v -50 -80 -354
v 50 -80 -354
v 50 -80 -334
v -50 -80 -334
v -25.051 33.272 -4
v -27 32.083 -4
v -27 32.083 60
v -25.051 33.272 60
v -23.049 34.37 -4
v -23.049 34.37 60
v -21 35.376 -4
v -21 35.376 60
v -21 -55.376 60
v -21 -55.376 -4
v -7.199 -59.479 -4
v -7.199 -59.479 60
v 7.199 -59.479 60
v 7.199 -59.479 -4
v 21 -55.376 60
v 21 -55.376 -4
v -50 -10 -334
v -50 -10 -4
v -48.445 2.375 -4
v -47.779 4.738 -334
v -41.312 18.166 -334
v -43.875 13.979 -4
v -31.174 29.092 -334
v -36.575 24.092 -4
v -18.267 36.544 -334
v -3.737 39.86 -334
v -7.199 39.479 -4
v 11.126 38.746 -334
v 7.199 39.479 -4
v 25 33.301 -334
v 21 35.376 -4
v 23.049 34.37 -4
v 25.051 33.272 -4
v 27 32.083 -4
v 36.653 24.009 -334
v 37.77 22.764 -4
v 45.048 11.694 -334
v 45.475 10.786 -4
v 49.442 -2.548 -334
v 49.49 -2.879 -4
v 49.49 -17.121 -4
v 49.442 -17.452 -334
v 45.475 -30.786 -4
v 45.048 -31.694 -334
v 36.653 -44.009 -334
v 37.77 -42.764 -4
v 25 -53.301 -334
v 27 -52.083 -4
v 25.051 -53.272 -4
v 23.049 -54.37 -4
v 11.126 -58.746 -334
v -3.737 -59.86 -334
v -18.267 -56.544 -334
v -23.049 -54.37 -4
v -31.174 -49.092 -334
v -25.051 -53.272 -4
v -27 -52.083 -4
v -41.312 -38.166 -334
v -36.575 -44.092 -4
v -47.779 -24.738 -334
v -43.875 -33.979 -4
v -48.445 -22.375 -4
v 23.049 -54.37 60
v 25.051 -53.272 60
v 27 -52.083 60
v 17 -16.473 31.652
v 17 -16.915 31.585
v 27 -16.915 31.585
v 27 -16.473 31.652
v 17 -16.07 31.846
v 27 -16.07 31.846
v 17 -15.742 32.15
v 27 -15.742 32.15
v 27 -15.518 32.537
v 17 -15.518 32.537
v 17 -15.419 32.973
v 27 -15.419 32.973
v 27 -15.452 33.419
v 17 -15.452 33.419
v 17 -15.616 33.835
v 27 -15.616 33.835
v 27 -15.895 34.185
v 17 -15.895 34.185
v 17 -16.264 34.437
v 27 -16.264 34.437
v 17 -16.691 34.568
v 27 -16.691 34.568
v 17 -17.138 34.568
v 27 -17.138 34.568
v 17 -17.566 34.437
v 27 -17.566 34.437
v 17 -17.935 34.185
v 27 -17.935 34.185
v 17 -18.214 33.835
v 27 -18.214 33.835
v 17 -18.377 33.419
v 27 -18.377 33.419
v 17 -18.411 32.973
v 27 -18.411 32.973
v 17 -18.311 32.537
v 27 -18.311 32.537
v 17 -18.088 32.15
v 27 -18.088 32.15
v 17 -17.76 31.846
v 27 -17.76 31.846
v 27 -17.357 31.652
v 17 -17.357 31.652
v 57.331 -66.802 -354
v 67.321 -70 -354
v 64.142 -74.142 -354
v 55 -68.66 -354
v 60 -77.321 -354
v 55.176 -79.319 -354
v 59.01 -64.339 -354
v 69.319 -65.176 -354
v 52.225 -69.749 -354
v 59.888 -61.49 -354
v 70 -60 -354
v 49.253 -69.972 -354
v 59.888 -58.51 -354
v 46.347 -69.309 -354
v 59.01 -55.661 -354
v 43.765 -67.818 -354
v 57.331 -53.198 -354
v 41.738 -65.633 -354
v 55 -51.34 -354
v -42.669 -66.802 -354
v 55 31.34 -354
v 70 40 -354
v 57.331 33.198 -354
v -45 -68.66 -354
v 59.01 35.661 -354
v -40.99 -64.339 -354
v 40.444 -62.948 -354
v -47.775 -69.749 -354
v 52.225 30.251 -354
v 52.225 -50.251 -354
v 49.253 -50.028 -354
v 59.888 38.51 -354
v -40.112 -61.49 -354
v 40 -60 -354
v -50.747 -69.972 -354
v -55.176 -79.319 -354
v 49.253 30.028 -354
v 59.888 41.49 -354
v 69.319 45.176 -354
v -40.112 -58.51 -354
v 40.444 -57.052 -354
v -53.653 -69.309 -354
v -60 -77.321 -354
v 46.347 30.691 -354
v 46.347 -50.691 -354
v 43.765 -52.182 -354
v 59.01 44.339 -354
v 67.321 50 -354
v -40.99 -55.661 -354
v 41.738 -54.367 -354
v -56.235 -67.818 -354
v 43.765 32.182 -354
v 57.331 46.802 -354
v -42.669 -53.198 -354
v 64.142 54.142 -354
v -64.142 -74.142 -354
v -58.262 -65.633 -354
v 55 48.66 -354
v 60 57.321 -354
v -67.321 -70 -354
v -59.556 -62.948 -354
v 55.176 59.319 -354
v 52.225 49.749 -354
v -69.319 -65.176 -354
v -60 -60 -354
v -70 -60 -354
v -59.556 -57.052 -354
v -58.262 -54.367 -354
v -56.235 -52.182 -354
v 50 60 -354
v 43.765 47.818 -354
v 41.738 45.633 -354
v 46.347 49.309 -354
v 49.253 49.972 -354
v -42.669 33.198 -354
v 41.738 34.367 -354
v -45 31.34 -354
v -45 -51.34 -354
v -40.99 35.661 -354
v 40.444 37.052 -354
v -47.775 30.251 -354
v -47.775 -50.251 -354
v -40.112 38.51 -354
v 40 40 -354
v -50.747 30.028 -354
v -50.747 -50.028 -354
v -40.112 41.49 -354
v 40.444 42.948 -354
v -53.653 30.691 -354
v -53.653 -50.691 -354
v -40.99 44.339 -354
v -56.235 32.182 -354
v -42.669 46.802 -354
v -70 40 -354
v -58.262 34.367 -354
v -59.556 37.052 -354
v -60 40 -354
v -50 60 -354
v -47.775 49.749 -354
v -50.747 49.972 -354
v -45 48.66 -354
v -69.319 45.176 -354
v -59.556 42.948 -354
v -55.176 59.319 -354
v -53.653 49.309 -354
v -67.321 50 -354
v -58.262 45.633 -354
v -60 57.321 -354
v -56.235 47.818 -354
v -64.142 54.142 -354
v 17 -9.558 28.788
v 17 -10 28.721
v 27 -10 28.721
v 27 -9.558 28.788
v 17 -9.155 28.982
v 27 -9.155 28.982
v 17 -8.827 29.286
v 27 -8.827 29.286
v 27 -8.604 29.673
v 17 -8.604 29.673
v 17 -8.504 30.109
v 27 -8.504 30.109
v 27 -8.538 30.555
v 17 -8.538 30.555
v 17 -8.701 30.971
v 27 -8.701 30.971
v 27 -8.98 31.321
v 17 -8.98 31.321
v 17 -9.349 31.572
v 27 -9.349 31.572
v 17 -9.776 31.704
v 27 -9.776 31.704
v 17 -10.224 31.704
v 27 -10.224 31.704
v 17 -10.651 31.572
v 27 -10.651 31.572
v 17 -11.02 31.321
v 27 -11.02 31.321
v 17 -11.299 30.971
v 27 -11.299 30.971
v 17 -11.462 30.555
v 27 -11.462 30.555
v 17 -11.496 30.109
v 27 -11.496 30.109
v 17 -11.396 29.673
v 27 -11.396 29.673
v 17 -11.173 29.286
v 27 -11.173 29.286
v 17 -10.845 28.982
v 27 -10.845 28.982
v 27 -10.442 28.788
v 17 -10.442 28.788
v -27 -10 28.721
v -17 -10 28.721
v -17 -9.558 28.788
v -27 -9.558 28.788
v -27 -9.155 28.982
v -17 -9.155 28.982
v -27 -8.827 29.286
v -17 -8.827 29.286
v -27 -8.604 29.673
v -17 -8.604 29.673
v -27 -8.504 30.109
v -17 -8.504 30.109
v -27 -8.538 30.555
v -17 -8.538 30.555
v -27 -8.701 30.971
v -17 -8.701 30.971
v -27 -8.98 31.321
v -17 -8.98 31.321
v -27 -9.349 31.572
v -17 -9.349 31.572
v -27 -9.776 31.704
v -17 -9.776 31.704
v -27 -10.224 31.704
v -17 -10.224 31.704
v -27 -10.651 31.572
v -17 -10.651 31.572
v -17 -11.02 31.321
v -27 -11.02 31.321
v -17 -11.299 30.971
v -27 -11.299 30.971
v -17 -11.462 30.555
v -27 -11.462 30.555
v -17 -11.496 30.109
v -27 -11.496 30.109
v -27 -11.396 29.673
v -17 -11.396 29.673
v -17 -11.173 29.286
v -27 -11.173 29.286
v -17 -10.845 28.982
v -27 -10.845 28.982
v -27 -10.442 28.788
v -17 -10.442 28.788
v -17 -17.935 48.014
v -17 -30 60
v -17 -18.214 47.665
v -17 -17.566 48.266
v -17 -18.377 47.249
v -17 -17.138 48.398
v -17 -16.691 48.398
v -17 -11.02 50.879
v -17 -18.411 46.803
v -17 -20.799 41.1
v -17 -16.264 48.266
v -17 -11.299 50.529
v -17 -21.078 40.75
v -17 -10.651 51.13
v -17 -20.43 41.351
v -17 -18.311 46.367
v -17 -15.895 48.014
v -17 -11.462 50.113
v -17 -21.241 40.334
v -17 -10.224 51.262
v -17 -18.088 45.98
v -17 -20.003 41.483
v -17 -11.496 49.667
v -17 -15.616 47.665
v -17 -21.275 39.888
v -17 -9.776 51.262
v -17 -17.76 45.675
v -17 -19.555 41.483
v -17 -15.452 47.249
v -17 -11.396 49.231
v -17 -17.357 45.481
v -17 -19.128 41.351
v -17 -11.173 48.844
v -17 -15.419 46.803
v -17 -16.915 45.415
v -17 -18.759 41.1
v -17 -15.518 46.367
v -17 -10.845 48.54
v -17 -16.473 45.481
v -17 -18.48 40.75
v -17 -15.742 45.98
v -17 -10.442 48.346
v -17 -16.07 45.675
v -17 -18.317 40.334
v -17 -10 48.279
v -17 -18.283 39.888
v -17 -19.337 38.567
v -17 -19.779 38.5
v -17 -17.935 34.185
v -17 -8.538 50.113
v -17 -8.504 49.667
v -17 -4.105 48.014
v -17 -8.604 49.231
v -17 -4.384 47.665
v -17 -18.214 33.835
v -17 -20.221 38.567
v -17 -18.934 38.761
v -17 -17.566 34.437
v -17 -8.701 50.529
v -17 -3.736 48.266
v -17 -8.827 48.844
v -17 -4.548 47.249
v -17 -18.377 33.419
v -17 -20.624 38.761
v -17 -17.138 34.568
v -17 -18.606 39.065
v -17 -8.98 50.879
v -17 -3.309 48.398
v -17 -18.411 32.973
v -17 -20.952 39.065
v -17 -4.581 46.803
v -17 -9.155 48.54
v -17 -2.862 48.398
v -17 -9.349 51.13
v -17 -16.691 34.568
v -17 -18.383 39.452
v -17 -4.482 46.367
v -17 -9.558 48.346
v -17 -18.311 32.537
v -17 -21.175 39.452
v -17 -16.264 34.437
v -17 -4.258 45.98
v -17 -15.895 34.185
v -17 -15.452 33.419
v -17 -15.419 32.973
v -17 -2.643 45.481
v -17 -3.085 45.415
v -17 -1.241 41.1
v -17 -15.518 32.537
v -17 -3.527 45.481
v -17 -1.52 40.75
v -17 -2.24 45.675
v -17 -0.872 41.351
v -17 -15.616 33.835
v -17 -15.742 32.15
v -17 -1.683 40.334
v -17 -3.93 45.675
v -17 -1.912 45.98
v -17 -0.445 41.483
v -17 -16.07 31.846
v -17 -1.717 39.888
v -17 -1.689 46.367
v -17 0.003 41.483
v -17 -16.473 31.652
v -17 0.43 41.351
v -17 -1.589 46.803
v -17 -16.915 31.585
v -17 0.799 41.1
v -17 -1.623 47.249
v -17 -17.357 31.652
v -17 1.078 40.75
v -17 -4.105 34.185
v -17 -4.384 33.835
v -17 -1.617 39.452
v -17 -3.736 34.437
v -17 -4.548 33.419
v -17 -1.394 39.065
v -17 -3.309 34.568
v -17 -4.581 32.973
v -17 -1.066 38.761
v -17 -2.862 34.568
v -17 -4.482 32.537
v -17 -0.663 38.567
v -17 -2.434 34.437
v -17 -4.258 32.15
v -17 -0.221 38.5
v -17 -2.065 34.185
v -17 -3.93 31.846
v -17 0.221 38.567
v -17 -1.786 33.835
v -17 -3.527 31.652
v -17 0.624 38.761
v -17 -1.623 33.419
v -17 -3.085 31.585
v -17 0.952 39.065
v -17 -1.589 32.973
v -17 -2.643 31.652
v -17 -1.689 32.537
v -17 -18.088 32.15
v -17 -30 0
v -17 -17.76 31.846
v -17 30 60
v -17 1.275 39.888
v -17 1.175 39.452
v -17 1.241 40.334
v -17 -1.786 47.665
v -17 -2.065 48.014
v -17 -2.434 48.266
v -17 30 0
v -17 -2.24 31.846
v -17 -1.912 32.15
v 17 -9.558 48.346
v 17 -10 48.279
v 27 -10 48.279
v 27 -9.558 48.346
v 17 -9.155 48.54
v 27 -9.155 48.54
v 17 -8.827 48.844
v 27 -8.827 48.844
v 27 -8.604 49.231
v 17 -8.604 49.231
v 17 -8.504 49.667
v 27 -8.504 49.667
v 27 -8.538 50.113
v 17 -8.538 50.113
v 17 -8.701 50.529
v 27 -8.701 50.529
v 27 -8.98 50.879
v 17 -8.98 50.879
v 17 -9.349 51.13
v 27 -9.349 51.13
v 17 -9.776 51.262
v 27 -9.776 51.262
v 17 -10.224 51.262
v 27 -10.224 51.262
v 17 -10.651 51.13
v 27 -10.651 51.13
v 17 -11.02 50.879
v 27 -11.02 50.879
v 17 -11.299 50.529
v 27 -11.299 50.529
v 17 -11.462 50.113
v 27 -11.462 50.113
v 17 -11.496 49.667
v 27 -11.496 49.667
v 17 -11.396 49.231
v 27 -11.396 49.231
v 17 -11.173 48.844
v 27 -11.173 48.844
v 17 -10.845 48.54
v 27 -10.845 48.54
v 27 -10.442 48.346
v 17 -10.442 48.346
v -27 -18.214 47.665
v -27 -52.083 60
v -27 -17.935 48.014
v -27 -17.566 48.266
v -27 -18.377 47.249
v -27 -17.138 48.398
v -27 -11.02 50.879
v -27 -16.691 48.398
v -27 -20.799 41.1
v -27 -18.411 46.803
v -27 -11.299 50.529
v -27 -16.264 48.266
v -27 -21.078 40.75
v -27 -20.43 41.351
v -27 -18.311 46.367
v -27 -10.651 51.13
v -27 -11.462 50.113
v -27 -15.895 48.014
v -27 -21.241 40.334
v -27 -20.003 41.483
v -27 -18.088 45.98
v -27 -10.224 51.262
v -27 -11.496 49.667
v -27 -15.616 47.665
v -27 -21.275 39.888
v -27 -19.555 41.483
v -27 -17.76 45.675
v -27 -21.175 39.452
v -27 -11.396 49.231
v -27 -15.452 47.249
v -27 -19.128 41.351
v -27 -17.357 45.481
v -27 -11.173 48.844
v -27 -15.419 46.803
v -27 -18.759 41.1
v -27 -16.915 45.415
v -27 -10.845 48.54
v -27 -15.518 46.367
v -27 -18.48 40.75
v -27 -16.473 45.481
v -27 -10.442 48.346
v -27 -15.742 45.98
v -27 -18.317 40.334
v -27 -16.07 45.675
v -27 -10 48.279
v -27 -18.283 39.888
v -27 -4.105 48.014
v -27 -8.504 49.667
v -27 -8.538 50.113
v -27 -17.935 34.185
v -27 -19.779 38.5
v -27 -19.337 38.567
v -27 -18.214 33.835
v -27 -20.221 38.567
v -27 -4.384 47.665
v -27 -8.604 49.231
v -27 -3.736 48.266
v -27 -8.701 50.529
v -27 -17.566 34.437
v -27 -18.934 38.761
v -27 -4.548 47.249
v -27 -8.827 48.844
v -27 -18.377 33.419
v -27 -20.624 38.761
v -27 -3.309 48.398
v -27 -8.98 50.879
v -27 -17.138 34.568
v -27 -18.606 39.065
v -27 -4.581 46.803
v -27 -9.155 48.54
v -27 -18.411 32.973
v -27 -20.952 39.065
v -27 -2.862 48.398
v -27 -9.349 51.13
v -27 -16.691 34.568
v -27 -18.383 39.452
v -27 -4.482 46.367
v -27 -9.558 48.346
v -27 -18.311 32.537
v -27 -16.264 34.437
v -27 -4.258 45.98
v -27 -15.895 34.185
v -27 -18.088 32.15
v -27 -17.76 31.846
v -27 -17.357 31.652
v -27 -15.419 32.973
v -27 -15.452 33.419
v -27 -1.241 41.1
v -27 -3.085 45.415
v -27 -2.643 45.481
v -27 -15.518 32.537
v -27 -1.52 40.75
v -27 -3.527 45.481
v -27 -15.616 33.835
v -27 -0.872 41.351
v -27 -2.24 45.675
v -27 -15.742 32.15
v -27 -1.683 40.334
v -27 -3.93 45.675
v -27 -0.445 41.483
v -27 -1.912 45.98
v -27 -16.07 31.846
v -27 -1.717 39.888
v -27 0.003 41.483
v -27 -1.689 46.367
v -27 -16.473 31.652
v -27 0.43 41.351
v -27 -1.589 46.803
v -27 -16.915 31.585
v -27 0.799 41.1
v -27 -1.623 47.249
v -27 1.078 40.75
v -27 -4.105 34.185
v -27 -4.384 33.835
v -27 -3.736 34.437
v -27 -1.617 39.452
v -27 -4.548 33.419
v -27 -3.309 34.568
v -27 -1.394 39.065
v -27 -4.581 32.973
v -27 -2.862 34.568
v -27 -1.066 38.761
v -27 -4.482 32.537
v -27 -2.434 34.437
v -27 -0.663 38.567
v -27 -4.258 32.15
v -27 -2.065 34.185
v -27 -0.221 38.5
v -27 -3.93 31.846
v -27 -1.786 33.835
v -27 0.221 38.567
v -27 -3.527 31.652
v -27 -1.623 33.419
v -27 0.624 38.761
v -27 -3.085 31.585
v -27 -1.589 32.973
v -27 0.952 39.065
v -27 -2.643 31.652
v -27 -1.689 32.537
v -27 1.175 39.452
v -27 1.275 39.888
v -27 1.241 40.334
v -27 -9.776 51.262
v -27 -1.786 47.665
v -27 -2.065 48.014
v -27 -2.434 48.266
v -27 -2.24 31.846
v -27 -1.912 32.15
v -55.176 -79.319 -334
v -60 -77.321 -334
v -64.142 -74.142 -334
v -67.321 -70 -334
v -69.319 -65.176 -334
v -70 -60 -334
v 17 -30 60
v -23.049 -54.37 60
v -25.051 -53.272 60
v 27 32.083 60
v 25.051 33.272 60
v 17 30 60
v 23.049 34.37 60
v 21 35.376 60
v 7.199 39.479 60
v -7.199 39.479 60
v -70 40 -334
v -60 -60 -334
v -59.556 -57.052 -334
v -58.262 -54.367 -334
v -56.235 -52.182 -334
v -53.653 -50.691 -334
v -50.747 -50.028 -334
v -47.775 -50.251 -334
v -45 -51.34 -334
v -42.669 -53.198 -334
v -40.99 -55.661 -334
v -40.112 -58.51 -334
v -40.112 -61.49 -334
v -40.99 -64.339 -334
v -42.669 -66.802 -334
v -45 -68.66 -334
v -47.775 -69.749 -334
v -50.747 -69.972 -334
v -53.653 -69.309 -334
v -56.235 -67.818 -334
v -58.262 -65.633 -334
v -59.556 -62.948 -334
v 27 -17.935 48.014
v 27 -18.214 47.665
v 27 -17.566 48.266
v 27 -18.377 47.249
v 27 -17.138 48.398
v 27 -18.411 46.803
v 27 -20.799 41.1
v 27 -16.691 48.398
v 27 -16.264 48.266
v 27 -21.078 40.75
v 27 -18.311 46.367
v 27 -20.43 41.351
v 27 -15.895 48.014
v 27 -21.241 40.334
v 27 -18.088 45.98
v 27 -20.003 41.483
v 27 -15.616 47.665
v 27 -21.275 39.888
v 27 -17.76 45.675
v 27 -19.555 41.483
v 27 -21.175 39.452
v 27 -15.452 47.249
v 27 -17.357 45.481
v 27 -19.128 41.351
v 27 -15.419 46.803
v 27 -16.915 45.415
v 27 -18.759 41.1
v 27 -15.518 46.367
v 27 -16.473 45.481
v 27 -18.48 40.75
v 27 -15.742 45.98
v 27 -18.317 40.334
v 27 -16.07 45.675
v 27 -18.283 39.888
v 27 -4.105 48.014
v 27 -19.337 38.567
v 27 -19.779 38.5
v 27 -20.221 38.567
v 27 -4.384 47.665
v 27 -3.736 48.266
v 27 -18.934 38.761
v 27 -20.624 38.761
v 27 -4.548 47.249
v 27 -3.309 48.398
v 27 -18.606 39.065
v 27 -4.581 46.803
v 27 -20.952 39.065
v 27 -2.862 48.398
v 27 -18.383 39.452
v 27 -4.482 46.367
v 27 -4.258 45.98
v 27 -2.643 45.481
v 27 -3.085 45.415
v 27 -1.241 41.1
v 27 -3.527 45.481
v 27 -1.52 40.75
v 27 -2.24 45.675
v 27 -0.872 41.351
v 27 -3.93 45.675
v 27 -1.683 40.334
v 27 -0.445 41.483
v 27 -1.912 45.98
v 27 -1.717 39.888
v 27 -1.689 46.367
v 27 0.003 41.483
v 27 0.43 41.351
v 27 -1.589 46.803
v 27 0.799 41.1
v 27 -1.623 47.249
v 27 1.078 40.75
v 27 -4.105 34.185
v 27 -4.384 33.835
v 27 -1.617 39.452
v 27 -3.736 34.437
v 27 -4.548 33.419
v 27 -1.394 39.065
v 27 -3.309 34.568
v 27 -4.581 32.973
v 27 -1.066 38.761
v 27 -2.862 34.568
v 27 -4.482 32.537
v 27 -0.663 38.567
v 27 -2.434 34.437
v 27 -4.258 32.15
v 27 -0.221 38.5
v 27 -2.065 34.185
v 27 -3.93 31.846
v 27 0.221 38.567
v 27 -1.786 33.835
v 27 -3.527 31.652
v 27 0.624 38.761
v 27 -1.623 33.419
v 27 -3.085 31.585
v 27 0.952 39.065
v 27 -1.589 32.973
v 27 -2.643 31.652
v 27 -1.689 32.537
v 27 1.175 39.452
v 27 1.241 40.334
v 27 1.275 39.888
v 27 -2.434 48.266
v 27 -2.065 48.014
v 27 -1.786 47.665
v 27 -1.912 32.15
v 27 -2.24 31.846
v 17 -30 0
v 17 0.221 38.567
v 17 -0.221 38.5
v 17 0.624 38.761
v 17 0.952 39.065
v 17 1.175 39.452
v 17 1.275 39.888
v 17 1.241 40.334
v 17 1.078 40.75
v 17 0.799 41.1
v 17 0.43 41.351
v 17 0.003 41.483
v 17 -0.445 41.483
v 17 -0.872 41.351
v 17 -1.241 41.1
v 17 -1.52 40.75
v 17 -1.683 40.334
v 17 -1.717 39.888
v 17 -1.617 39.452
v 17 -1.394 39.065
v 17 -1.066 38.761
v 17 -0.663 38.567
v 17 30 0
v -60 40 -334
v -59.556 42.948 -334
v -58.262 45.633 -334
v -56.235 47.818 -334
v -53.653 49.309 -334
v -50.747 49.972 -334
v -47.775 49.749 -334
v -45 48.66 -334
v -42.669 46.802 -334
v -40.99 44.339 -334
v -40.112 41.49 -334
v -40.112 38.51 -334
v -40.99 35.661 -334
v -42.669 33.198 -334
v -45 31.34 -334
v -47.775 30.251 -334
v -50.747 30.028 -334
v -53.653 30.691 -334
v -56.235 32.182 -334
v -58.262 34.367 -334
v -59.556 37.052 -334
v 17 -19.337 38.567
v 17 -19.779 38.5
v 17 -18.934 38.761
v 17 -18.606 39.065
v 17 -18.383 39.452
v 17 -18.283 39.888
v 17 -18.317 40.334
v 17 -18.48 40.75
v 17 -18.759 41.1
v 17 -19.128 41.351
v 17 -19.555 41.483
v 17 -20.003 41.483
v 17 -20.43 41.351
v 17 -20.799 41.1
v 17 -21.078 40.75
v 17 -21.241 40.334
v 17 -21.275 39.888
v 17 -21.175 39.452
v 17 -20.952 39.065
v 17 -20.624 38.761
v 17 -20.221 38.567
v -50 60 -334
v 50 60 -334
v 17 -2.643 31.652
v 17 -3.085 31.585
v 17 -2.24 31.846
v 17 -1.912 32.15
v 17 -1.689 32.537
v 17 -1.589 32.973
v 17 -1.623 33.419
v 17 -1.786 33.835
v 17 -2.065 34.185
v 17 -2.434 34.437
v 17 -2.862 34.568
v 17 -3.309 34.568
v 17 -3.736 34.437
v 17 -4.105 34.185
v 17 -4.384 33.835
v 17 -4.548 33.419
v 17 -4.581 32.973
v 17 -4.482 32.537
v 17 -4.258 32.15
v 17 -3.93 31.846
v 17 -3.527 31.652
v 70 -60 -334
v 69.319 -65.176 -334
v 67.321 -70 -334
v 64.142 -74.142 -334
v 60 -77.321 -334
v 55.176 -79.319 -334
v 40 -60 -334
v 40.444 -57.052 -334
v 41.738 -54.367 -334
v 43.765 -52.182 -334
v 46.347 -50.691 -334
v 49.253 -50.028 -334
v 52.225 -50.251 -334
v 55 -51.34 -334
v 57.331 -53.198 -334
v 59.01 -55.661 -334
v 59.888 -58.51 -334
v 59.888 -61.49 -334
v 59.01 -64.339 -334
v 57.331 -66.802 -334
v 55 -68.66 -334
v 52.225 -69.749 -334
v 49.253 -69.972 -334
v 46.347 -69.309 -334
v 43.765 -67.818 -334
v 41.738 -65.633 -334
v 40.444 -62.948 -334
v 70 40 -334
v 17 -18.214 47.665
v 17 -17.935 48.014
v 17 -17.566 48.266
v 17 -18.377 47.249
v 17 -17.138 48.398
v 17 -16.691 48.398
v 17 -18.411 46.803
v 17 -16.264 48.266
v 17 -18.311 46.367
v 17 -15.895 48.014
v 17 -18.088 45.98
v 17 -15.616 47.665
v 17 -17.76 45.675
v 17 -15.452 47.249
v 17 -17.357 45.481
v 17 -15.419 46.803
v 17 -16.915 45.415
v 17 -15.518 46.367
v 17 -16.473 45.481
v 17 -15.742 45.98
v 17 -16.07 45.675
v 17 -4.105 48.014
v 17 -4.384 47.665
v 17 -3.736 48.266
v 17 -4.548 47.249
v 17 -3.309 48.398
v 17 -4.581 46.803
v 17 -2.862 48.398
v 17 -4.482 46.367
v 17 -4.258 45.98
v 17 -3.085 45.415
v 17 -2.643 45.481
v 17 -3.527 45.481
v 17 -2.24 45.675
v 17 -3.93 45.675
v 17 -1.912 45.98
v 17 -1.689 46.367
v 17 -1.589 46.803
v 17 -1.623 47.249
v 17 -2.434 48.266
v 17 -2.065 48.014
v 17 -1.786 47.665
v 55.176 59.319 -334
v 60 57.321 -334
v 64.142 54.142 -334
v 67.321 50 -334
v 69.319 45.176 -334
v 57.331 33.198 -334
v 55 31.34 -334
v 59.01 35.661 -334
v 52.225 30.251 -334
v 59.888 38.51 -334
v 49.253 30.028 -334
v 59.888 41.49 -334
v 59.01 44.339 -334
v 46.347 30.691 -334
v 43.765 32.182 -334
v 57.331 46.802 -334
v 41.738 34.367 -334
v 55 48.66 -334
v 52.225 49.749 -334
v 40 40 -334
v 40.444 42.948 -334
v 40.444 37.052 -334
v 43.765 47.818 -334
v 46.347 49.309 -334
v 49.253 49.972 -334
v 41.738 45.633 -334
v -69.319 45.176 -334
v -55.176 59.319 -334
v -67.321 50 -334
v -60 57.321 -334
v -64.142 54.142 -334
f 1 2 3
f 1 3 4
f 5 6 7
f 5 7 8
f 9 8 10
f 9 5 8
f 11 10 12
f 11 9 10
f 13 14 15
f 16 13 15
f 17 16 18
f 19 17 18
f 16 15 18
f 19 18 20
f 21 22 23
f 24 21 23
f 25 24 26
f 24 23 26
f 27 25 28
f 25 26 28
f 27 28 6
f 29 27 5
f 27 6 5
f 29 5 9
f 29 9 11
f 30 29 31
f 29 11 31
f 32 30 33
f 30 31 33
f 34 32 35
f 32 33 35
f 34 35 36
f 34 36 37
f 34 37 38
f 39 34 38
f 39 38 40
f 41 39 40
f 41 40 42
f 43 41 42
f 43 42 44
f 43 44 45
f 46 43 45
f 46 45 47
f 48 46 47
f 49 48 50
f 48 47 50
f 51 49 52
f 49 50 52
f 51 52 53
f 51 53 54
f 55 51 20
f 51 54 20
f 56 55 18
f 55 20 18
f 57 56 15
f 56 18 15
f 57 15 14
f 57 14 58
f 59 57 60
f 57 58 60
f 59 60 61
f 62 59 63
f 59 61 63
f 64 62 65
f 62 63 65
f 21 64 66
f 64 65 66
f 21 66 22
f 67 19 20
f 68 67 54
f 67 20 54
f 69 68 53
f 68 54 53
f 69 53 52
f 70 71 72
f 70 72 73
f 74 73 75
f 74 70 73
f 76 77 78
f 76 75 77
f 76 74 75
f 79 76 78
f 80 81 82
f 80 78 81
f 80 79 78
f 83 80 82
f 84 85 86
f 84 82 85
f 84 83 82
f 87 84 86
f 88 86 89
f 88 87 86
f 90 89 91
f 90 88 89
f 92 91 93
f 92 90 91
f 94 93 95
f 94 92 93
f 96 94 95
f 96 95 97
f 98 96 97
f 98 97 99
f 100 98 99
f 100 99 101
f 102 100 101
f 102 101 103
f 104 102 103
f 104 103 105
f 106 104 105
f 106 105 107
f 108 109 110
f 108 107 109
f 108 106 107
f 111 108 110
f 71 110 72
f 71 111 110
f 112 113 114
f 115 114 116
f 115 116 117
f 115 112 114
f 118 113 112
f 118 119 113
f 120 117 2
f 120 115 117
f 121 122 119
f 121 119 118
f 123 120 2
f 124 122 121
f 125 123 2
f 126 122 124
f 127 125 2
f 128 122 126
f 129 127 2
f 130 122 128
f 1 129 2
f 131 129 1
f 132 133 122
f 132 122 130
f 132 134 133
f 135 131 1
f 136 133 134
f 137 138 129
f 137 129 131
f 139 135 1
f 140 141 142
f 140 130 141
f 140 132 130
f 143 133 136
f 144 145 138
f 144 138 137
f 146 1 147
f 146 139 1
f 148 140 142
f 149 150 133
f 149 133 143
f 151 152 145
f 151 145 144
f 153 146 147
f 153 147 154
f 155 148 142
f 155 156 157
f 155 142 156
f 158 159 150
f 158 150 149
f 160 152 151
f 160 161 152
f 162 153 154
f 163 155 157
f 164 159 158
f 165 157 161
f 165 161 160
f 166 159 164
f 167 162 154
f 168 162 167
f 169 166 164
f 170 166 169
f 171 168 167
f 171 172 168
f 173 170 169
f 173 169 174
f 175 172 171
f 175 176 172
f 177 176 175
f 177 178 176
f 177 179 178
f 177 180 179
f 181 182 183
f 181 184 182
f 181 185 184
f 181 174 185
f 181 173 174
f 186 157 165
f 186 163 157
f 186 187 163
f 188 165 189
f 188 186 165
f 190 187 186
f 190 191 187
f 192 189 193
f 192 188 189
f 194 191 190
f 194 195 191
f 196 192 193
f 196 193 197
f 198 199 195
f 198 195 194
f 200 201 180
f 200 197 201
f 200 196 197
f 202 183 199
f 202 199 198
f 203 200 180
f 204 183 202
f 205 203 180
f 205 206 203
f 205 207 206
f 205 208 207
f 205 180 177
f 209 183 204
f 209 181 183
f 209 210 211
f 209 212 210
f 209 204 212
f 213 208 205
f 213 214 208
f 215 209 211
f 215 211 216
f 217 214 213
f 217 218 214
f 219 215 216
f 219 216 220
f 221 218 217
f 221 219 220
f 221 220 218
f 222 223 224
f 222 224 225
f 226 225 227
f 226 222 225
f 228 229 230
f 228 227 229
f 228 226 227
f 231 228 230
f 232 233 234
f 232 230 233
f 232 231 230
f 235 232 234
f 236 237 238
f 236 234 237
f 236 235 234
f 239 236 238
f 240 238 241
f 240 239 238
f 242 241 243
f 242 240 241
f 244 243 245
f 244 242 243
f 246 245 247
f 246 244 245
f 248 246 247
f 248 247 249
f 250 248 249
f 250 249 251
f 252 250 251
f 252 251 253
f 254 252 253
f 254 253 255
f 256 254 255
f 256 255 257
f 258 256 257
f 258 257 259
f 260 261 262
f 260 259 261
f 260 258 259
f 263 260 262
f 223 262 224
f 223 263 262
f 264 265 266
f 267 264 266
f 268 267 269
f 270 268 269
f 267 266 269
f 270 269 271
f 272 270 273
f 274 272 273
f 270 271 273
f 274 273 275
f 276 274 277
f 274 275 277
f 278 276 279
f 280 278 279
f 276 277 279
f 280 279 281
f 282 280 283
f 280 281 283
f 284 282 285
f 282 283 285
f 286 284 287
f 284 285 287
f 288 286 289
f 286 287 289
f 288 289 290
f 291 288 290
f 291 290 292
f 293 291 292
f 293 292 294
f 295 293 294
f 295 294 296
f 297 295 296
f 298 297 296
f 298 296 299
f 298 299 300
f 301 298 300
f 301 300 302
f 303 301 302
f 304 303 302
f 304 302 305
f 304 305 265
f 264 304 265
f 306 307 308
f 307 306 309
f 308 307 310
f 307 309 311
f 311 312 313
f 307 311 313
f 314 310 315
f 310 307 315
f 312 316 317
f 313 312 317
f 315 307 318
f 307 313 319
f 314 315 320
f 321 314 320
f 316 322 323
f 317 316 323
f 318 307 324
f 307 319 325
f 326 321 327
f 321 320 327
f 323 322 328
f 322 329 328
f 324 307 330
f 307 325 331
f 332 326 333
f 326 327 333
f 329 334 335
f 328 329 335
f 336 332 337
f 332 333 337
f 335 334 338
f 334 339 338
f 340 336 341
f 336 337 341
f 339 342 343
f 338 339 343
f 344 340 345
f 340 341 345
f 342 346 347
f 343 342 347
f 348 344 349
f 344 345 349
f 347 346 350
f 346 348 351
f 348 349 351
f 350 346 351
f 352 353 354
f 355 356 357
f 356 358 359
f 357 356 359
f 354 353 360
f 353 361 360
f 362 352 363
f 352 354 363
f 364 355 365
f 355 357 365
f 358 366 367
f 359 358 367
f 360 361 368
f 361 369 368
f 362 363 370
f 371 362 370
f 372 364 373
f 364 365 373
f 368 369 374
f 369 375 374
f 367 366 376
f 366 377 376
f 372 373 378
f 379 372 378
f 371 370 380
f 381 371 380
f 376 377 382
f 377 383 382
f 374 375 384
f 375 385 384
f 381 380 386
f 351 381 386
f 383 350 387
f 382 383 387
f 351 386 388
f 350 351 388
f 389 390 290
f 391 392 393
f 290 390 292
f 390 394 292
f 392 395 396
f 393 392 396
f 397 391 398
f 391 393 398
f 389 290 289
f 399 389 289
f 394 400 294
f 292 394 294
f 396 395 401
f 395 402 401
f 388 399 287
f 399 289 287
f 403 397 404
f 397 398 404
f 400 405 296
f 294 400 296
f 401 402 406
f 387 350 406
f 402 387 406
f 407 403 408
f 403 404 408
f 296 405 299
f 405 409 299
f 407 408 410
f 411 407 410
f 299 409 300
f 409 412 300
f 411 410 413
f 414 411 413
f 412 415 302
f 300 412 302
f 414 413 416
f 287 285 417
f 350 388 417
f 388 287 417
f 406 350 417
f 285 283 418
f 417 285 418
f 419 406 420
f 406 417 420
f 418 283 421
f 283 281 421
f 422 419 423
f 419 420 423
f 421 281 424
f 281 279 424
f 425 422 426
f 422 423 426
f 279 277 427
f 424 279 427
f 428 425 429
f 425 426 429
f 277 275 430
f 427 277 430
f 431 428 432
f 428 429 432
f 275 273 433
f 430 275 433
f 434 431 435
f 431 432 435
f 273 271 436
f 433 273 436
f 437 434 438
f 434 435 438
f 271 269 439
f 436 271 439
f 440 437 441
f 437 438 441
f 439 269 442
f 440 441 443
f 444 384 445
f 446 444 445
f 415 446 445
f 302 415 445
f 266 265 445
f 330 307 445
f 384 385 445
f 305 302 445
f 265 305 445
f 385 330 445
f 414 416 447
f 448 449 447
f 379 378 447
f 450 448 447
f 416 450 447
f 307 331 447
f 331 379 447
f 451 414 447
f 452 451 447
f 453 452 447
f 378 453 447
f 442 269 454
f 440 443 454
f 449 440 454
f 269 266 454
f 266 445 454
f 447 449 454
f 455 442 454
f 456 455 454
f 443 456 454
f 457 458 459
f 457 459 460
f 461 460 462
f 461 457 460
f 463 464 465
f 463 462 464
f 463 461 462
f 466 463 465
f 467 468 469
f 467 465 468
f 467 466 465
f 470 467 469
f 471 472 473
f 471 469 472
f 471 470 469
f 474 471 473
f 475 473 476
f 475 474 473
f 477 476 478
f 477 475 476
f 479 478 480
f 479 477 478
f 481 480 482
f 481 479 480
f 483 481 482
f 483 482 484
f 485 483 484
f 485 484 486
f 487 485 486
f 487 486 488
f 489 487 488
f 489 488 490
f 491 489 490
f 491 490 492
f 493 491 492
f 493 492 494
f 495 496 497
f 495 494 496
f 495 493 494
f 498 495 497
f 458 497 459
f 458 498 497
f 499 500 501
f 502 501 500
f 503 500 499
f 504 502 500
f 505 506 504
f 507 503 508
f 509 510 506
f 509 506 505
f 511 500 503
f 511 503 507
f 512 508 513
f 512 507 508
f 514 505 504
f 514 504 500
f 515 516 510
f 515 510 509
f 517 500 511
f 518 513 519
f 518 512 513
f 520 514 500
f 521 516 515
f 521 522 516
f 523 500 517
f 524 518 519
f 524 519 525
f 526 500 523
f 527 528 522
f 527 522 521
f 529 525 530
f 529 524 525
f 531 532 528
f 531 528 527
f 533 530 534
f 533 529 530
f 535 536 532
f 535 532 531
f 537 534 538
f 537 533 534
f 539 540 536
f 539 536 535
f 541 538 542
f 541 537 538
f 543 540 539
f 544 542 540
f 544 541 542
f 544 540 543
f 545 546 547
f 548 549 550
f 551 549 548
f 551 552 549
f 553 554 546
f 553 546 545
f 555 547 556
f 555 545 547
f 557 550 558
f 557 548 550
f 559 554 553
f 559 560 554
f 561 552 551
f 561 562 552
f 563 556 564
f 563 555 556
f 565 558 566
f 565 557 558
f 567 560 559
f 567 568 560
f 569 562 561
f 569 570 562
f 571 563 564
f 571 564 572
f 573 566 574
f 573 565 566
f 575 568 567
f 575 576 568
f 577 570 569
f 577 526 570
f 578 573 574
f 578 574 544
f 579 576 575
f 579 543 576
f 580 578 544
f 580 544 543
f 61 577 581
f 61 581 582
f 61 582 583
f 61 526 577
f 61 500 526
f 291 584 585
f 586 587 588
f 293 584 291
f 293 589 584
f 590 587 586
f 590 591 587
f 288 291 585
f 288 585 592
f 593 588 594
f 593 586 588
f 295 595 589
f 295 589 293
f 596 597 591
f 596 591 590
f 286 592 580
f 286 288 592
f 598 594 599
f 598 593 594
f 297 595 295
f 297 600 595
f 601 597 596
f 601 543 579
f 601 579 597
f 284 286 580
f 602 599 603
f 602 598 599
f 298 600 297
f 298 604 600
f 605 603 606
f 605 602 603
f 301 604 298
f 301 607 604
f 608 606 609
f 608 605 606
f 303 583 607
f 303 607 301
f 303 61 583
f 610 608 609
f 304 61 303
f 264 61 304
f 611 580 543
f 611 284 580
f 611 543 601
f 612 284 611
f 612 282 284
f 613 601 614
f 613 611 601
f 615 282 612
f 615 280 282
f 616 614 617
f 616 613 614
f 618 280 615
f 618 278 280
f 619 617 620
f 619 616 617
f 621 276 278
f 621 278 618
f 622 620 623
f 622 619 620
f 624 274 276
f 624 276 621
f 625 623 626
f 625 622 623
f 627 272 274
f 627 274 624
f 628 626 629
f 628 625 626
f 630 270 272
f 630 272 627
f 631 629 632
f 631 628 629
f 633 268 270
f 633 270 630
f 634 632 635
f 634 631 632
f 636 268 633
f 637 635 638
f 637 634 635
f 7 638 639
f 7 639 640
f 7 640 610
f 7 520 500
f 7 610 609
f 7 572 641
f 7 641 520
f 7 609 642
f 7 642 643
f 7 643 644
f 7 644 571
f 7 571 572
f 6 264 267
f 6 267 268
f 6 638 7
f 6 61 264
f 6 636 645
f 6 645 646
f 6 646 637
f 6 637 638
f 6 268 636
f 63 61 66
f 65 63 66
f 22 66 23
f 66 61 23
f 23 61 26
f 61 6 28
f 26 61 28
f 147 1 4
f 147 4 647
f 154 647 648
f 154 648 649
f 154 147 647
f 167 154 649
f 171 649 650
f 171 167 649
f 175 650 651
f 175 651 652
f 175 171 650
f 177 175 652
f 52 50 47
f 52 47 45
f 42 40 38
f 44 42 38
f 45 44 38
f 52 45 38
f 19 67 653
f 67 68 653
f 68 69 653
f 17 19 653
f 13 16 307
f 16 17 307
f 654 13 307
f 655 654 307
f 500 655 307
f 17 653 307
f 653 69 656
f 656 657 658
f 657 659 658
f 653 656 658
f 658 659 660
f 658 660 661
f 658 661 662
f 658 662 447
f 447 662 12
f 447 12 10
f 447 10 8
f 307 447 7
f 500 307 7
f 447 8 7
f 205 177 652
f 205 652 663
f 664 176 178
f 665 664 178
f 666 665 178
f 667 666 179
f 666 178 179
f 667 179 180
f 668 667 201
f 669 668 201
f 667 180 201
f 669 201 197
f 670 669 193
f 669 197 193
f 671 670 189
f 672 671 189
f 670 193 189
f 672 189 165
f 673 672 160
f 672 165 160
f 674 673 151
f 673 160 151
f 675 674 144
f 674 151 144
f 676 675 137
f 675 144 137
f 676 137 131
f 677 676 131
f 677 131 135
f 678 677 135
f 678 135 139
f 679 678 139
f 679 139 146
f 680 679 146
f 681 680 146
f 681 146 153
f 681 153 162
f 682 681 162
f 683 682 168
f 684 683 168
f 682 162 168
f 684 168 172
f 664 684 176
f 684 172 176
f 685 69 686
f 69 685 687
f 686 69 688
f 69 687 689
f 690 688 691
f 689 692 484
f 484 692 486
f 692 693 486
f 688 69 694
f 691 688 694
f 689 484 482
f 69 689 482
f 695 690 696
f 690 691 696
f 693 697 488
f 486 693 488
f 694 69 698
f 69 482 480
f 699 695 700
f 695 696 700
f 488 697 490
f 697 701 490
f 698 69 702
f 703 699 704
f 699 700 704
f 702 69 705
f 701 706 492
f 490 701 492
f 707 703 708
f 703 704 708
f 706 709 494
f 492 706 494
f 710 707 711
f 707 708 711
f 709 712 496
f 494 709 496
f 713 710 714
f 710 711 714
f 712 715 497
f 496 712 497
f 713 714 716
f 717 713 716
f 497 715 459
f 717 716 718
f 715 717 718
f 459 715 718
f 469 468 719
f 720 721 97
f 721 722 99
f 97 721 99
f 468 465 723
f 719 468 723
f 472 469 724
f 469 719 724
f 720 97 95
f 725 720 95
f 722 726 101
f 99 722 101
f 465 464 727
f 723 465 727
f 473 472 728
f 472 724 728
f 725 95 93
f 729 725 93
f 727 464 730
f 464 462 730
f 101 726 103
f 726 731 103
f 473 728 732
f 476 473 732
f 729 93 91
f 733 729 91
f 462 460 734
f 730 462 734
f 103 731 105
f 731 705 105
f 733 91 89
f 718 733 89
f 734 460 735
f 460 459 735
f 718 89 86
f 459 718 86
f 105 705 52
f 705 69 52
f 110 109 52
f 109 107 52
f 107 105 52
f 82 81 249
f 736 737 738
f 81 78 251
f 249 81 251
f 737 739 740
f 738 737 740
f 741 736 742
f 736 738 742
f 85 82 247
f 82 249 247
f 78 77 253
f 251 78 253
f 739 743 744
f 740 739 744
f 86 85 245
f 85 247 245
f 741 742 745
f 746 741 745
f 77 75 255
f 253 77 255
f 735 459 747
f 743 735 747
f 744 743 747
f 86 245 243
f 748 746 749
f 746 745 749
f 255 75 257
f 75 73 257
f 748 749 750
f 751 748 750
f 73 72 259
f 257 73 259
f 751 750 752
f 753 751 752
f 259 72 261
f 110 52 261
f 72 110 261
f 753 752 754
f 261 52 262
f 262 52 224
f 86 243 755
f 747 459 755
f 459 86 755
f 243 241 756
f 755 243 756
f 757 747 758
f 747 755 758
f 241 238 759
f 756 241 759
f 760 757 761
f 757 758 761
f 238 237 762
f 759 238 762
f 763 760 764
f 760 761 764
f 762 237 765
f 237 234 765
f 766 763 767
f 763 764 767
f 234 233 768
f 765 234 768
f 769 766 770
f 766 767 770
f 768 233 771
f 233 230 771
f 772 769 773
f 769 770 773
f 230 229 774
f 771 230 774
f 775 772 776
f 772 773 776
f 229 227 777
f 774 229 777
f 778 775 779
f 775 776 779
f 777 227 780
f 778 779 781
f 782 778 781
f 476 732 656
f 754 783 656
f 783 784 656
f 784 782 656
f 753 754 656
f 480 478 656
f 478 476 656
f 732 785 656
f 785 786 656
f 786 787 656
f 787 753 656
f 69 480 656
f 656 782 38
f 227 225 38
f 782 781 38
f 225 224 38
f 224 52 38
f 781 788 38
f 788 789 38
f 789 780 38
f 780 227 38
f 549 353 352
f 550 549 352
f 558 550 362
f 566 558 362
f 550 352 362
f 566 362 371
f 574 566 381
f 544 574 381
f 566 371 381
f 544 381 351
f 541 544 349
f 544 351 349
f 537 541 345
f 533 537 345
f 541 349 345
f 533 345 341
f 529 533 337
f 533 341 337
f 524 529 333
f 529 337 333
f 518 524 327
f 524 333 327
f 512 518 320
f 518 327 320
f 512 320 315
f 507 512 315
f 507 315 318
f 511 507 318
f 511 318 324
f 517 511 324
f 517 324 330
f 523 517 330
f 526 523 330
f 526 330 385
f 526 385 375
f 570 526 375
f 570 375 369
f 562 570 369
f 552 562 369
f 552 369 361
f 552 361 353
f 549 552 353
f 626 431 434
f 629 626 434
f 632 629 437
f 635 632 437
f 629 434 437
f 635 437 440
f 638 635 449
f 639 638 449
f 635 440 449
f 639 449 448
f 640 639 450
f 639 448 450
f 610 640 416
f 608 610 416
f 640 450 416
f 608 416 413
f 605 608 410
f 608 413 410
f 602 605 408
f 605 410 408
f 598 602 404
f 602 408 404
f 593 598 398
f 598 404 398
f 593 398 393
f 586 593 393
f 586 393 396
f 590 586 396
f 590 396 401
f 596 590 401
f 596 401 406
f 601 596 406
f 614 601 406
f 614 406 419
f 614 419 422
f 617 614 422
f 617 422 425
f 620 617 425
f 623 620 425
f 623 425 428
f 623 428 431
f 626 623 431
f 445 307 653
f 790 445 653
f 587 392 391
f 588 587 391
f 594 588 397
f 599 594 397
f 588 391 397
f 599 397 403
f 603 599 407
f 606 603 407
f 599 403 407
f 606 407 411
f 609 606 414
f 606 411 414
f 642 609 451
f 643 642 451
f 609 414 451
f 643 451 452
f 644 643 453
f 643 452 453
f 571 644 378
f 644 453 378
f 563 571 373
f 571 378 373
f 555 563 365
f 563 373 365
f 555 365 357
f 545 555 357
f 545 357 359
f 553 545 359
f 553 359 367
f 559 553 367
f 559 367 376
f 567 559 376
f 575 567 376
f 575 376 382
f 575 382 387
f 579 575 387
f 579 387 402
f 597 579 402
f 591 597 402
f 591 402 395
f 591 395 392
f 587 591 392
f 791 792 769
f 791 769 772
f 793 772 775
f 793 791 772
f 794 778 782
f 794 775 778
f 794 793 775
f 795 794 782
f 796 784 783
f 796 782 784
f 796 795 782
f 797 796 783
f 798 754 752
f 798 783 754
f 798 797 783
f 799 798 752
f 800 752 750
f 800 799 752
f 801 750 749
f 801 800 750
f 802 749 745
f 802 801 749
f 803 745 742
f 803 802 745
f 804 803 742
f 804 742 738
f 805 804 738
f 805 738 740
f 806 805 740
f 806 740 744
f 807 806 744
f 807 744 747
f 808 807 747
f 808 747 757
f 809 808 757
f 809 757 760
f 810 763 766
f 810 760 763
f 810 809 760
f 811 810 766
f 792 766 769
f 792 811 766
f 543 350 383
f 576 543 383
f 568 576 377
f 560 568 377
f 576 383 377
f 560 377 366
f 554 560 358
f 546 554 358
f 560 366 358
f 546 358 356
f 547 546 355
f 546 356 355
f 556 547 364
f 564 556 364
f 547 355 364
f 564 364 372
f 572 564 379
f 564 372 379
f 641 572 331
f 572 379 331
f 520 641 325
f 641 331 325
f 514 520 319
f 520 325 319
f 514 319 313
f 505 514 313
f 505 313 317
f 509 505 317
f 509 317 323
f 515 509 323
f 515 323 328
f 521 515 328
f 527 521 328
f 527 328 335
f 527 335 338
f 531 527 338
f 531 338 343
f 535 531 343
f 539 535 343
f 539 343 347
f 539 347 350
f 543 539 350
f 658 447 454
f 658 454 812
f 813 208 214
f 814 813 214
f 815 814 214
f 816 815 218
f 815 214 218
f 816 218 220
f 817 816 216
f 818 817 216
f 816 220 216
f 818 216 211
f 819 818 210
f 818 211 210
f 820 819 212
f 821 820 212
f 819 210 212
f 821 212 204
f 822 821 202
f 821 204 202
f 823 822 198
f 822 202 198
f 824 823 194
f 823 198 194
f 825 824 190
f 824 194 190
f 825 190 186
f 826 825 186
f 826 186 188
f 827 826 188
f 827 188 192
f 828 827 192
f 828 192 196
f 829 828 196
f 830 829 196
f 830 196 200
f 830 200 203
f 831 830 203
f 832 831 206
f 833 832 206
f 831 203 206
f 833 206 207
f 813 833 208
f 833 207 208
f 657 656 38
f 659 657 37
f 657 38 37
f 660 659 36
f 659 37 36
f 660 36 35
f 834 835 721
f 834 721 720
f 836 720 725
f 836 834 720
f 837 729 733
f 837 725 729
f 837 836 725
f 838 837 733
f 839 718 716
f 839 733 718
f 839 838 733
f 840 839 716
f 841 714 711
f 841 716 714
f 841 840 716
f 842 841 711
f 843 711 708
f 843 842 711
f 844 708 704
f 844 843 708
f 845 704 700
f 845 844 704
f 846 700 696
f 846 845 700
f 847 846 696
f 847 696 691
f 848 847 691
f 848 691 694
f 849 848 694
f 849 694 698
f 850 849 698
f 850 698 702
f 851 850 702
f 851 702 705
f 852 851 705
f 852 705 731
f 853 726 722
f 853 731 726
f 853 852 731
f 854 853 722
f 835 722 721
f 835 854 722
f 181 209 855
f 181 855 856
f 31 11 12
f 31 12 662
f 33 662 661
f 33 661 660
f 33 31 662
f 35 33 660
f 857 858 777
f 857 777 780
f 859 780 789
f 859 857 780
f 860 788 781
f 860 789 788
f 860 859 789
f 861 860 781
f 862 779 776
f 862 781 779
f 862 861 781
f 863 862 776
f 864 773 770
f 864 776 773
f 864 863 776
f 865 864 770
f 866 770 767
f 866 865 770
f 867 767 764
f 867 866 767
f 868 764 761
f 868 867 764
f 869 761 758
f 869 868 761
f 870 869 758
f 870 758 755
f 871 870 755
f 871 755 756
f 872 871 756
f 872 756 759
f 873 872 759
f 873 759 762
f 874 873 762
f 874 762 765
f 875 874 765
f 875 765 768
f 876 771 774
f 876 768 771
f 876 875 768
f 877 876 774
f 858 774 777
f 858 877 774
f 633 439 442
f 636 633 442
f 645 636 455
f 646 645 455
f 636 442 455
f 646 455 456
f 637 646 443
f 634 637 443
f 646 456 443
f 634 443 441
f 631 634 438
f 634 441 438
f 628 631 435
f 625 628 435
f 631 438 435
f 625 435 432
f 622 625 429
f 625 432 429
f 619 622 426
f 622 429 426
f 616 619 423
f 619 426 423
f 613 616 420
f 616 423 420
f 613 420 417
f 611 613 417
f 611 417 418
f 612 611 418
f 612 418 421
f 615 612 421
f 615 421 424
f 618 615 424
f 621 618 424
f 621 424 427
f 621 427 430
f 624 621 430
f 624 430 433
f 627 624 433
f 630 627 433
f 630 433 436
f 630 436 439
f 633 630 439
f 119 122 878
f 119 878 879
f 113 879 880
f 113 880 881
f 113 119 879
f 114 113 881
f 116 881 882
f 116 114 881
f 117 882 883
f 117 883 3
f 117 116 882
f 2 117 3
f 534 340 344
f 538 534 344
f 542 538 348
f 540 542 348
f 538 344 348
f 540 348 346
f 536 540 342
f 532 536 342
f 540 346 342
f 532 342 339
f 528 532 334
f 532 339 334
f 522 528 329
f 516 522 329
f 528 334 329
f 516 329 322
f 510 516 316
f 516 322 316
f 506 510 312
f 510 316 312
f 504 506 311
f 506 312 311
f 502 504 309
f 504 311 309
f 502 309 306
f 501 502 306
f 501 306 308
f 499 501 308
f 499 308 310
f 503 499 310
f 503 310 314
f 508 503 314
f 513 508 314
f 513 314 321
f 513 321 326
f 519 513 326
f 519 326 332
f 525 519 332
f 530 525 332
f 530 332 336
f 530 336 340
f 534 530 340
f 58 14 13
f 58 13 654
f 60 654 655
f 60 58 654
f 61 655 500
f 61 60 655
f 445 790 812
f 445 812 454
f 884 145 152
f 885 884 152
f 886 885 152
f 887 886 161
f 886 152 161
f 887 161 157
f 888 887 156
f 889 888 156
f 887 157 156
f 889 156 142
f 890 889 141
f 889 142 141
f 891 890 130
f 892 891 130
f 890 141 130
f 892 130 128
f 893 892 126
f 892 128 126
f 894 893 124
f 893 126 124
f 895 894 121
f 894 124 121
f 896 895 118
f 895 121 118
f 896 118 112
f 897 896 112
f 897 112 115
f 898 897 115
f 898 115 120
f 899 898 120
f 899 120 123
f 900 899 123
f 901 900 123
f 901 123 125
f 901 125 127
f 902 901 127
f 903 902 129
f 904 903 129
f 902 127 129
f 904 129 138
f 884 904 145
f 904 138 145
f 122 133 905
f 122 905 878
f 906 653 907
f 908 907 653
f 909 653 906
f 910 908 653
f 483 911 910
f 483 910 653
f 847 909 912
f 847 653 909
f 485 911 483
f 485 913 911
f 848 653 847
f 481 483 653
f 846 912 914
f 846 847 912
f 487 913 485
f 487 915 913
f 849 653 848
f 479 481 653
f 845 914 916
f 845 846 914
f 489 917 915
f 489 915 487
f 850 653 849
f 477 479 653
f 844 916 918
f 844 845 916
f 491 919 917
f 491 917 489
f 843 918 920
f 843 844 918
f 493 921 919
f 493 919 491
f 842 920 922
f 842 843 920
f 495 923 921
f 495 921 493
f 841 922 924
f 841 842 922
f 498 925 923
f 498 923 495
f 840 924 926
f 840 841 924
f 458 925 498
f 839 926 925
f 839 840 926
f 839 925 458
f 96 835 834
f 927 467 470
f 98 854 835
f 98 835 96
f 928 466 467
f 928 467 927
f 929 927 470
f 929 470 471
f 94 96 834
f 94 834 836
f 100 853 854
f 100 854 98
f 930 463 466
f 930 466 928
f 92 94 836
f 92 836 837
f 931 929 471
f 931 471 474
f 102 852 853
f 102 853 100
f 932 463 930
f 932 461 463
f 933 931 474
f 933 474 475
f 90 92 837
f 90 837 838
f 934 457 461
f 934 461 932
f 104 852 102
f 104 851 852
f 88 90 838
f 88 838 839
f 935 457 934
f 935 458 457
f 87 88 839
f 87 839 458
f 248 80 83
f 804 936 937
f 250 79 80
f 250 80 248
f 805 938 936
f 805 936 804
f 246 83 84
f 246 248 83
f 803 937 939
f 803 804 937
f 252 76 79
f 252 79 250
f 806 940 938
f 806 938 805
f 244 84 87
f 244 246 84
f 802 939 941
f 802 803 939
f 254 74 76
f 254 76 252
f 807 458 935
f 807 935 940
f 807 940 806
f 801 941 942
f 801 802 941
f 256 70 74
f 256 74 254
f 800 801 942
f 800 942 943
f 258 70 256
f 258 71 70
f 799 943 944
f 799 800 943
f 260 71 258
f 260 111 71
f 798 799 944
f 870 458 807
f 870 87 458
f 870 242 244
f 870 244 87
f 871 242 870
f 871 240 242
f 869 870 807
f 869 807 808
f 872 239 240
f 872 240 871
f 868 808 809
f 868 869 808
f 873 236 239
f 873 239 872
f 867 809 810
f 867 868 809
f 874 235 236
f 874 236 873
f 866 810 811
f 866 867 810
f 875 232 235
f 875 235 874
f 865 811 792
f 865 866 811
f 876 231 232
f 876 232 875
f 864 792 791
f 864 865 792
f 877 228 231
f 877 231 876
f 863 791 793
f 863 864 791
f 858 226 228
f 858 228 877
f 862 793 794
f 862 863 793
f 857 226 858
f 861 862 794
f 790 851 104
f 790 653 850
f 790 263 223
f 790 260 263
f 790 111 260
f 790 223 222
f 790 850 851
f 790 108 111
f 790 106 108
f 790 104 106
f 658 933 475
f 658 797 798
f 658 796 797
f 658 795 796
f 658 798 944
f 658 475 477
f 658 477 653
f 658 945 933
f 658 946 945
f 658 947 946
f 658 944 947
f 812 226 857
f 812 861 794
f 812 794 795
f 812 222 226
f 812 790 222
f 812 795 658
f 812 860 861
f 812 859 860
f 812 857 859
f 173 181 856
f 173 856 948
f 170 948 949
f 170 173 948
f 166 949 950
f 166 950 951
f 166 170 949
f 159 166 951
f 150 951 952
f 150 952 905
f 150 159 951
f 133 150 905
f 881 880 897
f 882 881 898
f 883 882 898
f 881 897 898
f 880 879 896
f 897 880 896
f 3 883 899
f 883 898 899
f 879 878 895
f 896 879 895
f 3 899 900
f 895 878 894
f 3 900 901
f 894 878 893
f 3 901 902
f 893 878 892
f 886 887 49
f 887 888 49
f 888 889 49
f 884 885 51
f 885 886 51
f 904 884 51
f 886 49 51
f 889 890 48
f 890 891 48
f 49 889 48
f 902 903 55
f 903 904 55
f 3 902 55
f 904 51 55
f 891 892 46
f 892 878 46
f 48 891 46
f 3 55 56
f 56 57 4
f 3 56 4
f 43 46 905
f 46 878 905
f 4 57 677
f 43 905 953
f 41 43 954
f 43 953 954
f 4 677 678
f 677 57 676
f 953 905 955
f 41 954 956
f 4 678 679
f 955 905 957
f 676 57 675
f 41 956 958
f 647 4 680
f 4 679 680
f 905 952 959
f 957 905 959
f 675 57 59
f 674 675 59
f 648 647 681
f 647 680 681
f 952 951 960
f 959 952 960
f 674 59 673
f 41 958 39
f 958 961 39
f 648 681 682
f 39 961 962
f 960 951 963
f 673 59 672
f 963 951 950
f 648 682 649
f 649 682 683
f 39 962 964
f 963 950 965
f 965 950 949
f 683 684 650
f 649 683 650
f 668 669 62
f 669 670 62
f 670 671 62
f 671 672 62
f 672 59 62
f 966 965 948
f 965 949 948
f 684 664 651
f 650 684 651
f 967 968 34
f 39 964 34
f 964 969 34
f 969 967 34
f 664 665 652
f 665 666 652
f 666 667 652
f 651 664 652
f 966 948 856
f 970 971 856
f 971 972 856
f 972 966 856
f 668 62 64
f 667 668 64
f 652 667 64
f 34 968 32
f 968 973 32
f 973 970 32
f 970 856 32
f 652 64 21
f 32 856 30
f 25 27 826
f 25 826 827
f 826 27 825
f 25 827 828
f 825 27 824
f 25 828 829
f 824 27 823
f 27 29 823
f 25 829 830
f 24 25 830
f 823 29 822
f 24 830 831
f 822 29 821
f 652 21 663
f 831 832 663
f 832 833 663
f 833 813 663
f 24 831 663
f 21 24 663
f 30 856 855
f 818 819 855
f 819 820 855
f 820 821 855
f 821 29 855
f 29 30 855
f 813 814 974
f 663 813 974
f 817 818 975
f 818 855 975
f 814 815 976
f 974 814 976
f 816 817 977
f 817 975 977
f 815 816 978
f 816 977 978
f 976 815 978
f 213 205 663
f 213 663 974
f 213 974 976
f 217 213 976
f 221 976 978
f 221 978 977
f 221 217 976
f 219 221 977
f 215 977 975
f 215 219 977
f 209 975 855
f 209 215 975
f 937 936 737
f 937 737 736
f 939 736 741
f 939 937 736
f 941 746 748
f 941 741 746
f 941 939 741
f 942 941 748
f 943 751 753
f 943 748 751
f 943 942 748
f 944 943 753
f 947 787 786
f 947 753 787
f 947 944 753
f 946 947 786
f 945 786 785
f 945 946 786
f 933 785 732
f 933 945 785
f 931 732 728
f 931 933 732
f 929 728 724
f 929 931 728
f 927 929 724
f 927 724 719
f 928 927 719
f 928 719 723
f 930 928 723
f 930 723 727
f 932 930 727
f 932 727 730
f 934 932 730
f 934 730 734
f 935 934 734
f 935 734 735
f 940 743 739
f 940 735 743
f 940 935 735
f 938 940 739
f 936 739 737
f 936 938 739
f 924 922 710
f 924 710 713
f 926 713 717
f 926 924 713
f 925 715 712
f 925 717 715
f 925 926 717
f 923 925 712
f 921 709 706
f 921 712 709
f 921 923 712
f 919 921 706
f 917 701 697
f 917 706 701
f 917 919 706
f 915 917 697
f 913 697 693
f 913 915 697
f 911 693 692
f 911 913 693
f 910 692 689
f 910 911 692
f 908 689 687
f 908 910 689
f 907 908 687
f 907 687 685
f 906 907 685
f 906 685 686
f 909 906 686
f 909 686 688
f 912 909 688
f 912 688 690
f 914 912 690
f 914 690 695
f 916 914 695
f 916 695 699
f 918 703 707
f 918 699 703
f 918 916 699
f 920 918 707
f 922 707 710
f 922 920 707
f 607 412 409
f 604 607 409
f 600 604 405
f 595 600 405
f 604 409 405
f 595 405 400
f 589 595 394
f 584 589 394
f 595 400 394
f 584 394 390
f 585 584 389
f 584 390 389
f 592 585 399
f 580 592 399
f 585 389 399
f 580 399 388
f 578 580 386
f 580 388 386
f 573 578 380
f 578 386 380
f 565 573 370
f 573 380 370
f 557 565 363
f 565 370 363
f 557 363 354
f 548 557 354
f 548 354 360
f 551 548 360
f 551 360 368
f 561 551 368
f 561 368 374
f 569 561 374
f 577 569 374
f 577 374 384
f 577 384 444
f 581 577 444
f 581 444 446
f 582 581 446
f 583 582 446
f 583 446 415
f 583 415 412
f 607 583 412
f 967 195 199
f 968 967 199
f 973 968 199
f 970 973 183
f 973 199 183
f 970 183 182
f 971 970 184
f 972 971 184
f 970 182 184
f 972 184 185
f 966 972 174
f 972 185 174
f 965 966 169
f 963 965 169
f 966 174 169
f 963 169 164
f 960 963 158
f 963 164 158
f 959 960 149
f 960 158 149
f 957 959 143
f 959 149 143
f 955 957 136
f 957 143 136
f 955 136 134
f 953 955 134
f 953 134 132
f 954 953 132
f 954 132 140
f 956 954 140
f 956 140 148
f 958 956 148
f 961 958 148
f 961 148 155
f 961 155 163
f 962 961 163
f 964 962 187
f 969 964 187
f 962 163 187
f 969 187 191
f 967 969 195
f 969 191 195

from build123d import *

# Parameters (mm, degrees)
CROQUIS1_W                 = 42
CROQUIS1_H                 = 68
CROQUIS1_W_2               = 34
CROQUIS1_H_2               = 60
SALIENTE_EXTRUIR1_DEPTH    = 60
CROQUIS2_R                 = 1.5
CORTAR_EXTRUIR1_DEPTH      = 39
CORTAR_EXTRUIR1_DEPTH_BACK = 5
CROQUIS3_W                 = 42
CROQUIS3_H                 = 68
SALIENTE_EXTRUIR2_DEPTH    = 4
CROQUIS4_W                 = 64
CROQUIS4_H                 = 20
SALIENTE_EXTRUIR3_DEPTH    = 42
SALIENTE_EXTRUIR4_DEPTH    = 64
SALIENTE_EXTRUIR6_DEPTH    = 64
CROQUIS8_R                 = 50
SALIENTE_EXTRUIR7_DEPTH    = 350
SALIENTE_EXTRUIR8_START    = -4
SALIENTE_EXTRUIR8_DEPTH    = 64
CROQUIS11_R                = 1.5
CORTAR_EXTRUIR2_DEPTH      = 68
CORTAR_EXTRUIR2_DEPTH_BACK = 34
CROQUIS13_R                = 10
CROQUIS13_R_2              = 50
SALIENTE_EXTRUIR9_DEPTH    = 20


with BuildPart() as part:
    # Croquis1 → Saliente-Extruir1 (new body)
    with BuildSketch(Plane.XY):
        Rectangle(CROQUIS1_W, CROQUIS1_H)
        Rectangle(CROQUIS1_W_2, CROQUIS1_H_2, mode=Mode.SUBTRACT)
    extrude(amount=SALIENTE_EXTRUIR1_DEPTH)

    # Croquis2 → Cortar-Extruir1 (cut, two sides)
    with BuildSketch(Plane(origin=(-17, 0, 0), x_dir=(0, 0, -1), z_dir=(1, 0, 0))) as cortar_extruir1_sk:
        with Locations((-49.779, -10)):
            Circle(CROQUIS2_R)
        with Locations((-46.914797213, -3.085202787)):
            Circle(CROQUIS2_R)
        with Locations((-40, -0.221)):
            Circle(CROQUIS2_R)
        with Locations((-33.085202787, -3.085202787)):
            Circle(CROQUIS2_R)
        with Locations((-30.221, -10)):
            Circle(CROQUIS2_R)
        with Locations((-33.085202787, -16.914797213)):
            Circle(CROQUIS2_R)
        with Locations((-40, -19.779)):
            Circle(CROQUIS2_R)
        with Locations((-46.914797213, -16.914797213)):
            Circle(CROQUIS2_R)
    extrude(amount=CORTAR_EXTRUIR1_DEPTH, mode=Mode.SUBTRACT)
    extrude(cortar_extruir1_sk.sketch, amount=-CORTAR_EXTRUIR1_DEPTH_BACK, mode=Mode.SUBTRACT)

    # Croquis3 → Saliente-Extruir2 (add)
    with BuildSketch(Plane(origin=(0, 0, 0), x_dir=(-1, 0, 0), z_dir=(0, 0, -1))):
        Rectangle(CROQUIS3_W, CROQUIS3_H)
    extrude(amount=SALIENTE_EXTRUIR2_DEPTH)

    # Croquis4 → Saliente-Extruir3 (add)
    with BuildSketch(Plane(origin=(21, 0, 0), x_dir=(0, 0, -1), z_dir=(1, 0, 0))):
        with Locations((-28, -44)):
            Rectangle(CROQUIS4_W, CROQUIS4_H)
    extrude(amount=-SALIENTE_EXTRUIR3_DEPTH)

    # Croquis5 → Saliente-Extruir4 (add)
    with BuildSketch(Plane(origin=(0, 0, -4), x_dir=(-1, 0, 0), z_dir=(0, 0, -1))):
        with BuildLine():
            ThreePointArc((21, 34), (0, 38.754486973), (-21, 34))
            Line((-21, 34), (21, 34))
        make_face()
        with BuildLine():
            ThreePointArc((-21, -54), (0, -58.754486973), (21, -54))
            Line((21, -54), (-21, -54))
        make_face()
    extrude(amount=-SALIENTE_EXTRUIR4_DEPTH)

    # Croquis6 → Saliente-Extruir6 (add)
    with BuildSketch(Plane(origin=(0, 0, -4), x_dir=(-1, 0, 0), z_dir=(0, 0, -1))):
        with BuildLine():
            Line((-21, 34), (21, 34))
            Line((21, 34), (21, 35.376205218))
            ThreePointArc((21, 35.376205218), (0, 40), (-21, 35.376205218))
            Line((-21, 35.376205218), (-21, 34))
        make_face()
        with BuildLine():
            Line((-21, -55.376205218), (-21, -54))
            Line((-21, -54), (21, -54))
            Line((21, -54), (21, -55.376205218))
            ThreePointArc((21, -55.376205218), (0, -60), (-21, -55.376205218))
        make_face()
    extrude(amount=-SALIENTE_EXTRUIR6_DEPTH)

    # Croquis8 → Saliente-Extruir7 (add)
    with BuildSketch(Plane(origin=(0, 0, -4), x_dir=(-1, 0, 0), z_dir=(0, 0, -1))):
        with Locations((0, -10)):
            Circle(CROQUIS8_R)
    extrude(amount=SALIENTE_EXTRUIR7_DEPTH)

    # Croquis10 → Saliente-Extruir8 (add)
    with BuildSketch(Plane.XY.offset(SALIENTE_EXTRUIR8_START)):
        with BuildLine():
            Line((-21, 35.376205218), (-21, -55.376205218))
            ThreePointArc((-21, -55.376205218), (-24.056410521, -53.832512053), (-27, -52.083250825))
            Line((-27, -52.083250825), (-27, 32.083250825))
            ThreePointArc((-27, 32.083250825), (-24.056410521, 33.832512053), (-21, 35.376205218))
        make_face()
        with BuildLine():
            Line((21, 35.376205218), (21, -55.376205218))
            ThreePointArc((21, -55.376205218), (24.056410521, -53.832512053), (27, -52.083250825))
            Line((27, -52.083250825), (27, 32.083250825))
            ThreePointArc((27, 32.083250825), (24.056410521, 33.832512053), (21, 35.376205218))
        make_face()
    extrude(amount=SALIENTE_EXTRUIR8_DEPTH)

    # Croquis11 → Cortar-Extruir2 (cut, two sides)
    with BuildSketch(Plane(origin=(-17, 0, 0), x_dir=(0, 0, -1), z_dir=(1, 0, 0))) as cortar_extruir2_sk:
        with Locations((-49.779, -10)):
            Circle(CROQUIS11_R)
        with Locations((-46.914797213, -3.085202787)):
            Circle(CROQUIS11_R)
        with Locations((-40, -0.221)):
            Circle(CROQUIS11_R)
        with Locations((-33.085202787, -3.085202787)):
            Circle(CROQUIS11_R)
        with Locations((-30.221, -10)):
            Circle(CROQUIS11_R)
        with Locations((-33.085202787, -16.914797213)):
            Circle(CROQUIS11_R)
        with Locations((-40, -19.779)):
            Circle(CROQUIS11_R)
        with Locations((-46.914797213, -16.914797213)):
            Circle(CROQUIS11_R)
    extrude(amount=CORTAR_EXTRUIR2_DEPTH, mode=Mode.SUBTRACT)
    extrude(cortar_extruir2_sk.sketch, amount=-CORTAR_EXTRUIR2_DEPTH_BACK, mode=Mode.SUBTRACT)

    # Croquis13 → Saliente-Extruir9 (add)
    with BuildSketch(Plane(origin=(0, 0, -354), x_dir=(-1, 0, 0), z_dir=(0, 0, -1))):
        with BuildLine():
            Line((-50, -80), (50, -80))
            ThreePointArc((50, -80), (64.142135624, -74.142135624), (70, -60))
            Line((70, -60), (70, 40))
            ThreePointArc((70, 40), (64.142135624, 54.142135624), (50, 60))
            Line((50, 60), (-50, 60))
            ThreePointArc((-50, 60), (-64.142135624, 54.142135624), (-70, 40))
            Line((-70, 40), (-70, -60))
            ThreePointArc((-70, -60), (-64.142135624, -74.142135624), (-50, -80))
        make_face()
        with Locations((-50, 40)):
            Circle(CROQUIS13_R, mode=Mode.SUBTRACT)
        with Locations((-50, -60)):
            Circle(CROQUIS13_R, mode=Mode.SUBTRACT)
        with Locations((50, 40)):
            Circle(CROQUIS13_R, mode=Mode.SUBTRACT)
        with Locations((50, -60)):
            Circle(CROQUIS13_R, mode=Mode.SUBTRACT)
        with Locations((0, -10)):
            Circle(CROQUIS13_R_2, mode=Mode.SUBTRACT)
    extrude(amount=-SALIENTE_EXTRUIR9_DEPTH)


solid = part.part
